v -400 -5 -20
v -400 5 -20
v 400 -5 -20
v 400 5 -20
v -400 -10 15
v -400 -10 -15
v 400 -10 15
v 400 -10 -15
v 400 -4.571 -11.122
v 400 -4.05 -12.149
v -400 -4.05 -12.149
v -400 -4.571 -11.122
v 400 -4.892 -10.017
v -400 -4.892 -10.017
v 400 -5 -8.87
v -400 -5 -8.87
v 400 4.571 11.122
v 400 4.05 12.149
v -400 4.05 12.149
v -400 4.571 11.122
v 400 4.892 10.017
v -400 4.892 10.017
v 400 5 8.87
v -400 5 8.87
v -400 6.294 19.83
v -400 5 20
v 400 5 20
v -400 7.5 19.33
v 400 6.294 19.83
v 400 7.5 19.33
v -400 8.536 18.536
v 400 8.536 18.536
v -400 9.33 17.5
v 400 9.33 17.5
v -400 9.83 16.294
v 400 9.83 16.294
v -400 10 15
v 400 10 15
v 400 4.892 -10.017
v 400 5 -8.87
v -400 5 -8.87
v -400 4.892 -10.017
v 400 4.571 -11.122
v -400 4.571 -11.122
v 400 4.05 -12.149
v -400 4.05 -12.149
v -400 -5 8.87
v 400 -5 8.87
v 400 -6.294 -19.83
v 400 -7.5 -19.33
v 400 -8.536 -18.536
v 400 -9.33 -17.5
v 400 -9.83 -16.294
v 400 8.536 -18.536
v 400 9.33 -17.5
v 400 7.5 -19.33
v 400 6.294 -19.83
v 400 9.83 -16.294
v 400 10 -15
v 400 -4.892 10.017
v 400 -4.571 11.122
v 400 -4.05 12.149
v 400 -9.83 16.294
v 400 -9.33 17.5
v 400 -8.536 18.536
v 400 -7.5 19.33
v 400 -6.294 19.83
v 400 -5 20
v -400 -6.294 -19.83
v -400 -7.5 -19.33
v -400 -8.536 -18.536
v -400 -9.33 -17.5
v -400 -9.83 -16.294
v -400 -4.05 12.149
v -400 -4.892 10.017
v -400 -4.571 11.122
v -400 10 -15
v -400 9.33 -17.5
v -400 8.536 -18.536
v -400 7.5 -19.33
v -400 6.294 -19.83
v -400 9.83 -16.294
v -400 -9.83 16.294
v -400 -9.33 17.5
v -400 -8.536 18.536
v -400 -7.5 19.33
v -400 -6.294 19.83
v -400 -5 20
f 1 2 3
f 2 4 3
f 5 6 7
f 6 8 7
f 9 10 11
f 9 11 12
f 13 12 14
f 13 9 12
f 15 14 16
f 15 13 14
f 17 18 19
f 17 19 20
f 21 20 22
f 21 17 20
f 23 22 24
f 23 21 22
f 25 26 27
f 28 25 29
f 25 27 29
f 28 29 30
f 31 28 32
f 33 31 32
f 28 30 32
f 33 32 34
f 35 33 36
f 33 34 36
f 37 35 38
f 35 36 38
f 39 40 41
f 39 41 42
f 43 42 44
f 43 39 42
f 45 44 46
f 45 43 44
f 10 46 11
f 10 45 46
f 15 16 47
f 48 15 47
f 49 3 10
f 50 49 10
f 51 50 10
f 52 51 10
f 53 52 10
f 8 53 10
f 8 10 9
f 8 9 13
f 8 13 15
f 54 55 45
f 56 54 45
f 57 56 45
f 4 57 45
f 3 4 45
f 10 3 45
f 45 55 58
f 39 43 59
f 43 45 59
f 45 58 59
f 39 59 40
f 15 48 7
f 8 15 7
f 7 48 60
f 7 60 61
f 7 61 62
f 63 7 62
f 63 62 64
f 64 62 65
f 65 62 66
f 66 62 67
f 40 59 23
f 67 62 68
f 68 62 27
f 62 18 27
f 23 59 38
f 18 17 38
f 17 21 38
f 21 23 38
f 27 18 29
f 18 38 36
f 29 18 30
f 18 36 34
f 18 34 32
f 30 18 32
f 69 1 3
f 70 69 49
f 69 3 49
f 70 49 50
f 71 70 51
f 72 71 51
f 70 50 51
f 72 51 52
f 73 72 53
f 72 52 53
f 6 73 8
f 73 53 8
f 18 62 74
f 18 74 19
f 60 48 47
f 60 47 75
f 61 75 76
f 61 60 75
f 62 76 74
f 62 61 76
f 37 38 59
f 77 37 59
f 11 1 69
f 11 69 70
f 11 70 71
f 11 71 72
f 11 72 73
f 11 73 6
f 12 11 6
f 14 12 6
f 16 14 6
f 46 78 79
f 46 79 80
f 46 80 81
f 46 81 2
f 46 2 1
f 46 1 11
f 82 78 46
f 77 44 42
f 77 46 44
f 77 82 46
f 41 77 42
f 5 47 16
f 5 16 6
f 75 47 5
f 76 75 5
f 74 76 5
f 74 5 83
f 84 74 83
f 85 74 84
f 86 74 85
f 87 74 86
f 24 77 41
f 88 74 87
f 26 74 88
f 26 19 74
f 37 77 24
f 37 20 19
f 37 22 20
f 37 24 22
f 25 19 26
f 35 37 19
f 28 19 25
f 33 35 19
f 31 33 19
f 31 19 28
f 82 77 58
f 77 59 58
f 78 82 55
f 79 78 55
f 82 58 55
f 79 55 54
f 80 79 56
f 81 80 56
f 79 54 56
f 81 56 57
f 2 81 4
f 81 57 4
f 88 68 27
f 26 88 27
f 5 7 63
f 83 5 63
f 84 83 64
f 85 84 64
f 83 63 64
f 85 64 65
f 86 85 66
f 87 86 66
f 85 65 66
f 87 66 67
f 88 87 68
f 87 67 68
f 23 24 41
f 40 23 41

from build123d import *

# Parameters (mm, degrees)
BOSS_EXTRUDE1_DEPTH = 400


with BuildPart() as part:
    # Sketch1 → Boss-Extrude1 (new, symmetric)
    with BuildSketch(Plane(origin=(0, 0, 0), x_dir=(0, 0, -1), z_dir=(1, 0, 0))):
        with BuildLine():
            Line((-15, 10), (15, 10))
            ThreePointArc((15, 10), (18.535533906, 8.535533906), (20, 5))
            Line((20, 5), (20, -5))
            ThreePointArc((20, -5), (18.535533906, -8.535533906), (15, -10))
            Line((15, -10), (-15, -10))
            ThreePointArc((-15, -10), (-18.535533906, -8.535533906), (-20, -5))
            Line((-20, -5), (-20, 5))
            ThreePointArc((-20, 5), (-18.535533906, 8.535533906), (-15, 10))
        make_face()
        with BuildLine():
            Line((12.148766077, 4.049588692), (12.148766077, -4.049588692))
            ThreePointArc((12.148766077, -4.049588692), (10.577040219, -4.75760445), (8.870332019, -5))
            Line((8.870332019, -5), (-8.870332019, -5))
            ThreePointArc((-8.870332019, -5), (-10.577040219, -4.75760445), (-12.148766077, -4.049588692))
            Line((-12.148766077, -4.049588692), (-12.148766077, 4.049588692))
            ThreePointArc((-12.148766077, 4.049588692), (-10.577040219, 4.75760445), (-8.870332019, 5))
            Line((-8.870332019, 5), (8.870332019, 5))
            ThreePointArc((8.870332019, 5), (10.577040219, 4.75760445), (12.148766077, 4.049588692))
        make_face(mode=Mode.SUBTRACT)
    extrude(amount=BOSS_EXTRUDE1_DEPTH, both=True)


solid = part.part
